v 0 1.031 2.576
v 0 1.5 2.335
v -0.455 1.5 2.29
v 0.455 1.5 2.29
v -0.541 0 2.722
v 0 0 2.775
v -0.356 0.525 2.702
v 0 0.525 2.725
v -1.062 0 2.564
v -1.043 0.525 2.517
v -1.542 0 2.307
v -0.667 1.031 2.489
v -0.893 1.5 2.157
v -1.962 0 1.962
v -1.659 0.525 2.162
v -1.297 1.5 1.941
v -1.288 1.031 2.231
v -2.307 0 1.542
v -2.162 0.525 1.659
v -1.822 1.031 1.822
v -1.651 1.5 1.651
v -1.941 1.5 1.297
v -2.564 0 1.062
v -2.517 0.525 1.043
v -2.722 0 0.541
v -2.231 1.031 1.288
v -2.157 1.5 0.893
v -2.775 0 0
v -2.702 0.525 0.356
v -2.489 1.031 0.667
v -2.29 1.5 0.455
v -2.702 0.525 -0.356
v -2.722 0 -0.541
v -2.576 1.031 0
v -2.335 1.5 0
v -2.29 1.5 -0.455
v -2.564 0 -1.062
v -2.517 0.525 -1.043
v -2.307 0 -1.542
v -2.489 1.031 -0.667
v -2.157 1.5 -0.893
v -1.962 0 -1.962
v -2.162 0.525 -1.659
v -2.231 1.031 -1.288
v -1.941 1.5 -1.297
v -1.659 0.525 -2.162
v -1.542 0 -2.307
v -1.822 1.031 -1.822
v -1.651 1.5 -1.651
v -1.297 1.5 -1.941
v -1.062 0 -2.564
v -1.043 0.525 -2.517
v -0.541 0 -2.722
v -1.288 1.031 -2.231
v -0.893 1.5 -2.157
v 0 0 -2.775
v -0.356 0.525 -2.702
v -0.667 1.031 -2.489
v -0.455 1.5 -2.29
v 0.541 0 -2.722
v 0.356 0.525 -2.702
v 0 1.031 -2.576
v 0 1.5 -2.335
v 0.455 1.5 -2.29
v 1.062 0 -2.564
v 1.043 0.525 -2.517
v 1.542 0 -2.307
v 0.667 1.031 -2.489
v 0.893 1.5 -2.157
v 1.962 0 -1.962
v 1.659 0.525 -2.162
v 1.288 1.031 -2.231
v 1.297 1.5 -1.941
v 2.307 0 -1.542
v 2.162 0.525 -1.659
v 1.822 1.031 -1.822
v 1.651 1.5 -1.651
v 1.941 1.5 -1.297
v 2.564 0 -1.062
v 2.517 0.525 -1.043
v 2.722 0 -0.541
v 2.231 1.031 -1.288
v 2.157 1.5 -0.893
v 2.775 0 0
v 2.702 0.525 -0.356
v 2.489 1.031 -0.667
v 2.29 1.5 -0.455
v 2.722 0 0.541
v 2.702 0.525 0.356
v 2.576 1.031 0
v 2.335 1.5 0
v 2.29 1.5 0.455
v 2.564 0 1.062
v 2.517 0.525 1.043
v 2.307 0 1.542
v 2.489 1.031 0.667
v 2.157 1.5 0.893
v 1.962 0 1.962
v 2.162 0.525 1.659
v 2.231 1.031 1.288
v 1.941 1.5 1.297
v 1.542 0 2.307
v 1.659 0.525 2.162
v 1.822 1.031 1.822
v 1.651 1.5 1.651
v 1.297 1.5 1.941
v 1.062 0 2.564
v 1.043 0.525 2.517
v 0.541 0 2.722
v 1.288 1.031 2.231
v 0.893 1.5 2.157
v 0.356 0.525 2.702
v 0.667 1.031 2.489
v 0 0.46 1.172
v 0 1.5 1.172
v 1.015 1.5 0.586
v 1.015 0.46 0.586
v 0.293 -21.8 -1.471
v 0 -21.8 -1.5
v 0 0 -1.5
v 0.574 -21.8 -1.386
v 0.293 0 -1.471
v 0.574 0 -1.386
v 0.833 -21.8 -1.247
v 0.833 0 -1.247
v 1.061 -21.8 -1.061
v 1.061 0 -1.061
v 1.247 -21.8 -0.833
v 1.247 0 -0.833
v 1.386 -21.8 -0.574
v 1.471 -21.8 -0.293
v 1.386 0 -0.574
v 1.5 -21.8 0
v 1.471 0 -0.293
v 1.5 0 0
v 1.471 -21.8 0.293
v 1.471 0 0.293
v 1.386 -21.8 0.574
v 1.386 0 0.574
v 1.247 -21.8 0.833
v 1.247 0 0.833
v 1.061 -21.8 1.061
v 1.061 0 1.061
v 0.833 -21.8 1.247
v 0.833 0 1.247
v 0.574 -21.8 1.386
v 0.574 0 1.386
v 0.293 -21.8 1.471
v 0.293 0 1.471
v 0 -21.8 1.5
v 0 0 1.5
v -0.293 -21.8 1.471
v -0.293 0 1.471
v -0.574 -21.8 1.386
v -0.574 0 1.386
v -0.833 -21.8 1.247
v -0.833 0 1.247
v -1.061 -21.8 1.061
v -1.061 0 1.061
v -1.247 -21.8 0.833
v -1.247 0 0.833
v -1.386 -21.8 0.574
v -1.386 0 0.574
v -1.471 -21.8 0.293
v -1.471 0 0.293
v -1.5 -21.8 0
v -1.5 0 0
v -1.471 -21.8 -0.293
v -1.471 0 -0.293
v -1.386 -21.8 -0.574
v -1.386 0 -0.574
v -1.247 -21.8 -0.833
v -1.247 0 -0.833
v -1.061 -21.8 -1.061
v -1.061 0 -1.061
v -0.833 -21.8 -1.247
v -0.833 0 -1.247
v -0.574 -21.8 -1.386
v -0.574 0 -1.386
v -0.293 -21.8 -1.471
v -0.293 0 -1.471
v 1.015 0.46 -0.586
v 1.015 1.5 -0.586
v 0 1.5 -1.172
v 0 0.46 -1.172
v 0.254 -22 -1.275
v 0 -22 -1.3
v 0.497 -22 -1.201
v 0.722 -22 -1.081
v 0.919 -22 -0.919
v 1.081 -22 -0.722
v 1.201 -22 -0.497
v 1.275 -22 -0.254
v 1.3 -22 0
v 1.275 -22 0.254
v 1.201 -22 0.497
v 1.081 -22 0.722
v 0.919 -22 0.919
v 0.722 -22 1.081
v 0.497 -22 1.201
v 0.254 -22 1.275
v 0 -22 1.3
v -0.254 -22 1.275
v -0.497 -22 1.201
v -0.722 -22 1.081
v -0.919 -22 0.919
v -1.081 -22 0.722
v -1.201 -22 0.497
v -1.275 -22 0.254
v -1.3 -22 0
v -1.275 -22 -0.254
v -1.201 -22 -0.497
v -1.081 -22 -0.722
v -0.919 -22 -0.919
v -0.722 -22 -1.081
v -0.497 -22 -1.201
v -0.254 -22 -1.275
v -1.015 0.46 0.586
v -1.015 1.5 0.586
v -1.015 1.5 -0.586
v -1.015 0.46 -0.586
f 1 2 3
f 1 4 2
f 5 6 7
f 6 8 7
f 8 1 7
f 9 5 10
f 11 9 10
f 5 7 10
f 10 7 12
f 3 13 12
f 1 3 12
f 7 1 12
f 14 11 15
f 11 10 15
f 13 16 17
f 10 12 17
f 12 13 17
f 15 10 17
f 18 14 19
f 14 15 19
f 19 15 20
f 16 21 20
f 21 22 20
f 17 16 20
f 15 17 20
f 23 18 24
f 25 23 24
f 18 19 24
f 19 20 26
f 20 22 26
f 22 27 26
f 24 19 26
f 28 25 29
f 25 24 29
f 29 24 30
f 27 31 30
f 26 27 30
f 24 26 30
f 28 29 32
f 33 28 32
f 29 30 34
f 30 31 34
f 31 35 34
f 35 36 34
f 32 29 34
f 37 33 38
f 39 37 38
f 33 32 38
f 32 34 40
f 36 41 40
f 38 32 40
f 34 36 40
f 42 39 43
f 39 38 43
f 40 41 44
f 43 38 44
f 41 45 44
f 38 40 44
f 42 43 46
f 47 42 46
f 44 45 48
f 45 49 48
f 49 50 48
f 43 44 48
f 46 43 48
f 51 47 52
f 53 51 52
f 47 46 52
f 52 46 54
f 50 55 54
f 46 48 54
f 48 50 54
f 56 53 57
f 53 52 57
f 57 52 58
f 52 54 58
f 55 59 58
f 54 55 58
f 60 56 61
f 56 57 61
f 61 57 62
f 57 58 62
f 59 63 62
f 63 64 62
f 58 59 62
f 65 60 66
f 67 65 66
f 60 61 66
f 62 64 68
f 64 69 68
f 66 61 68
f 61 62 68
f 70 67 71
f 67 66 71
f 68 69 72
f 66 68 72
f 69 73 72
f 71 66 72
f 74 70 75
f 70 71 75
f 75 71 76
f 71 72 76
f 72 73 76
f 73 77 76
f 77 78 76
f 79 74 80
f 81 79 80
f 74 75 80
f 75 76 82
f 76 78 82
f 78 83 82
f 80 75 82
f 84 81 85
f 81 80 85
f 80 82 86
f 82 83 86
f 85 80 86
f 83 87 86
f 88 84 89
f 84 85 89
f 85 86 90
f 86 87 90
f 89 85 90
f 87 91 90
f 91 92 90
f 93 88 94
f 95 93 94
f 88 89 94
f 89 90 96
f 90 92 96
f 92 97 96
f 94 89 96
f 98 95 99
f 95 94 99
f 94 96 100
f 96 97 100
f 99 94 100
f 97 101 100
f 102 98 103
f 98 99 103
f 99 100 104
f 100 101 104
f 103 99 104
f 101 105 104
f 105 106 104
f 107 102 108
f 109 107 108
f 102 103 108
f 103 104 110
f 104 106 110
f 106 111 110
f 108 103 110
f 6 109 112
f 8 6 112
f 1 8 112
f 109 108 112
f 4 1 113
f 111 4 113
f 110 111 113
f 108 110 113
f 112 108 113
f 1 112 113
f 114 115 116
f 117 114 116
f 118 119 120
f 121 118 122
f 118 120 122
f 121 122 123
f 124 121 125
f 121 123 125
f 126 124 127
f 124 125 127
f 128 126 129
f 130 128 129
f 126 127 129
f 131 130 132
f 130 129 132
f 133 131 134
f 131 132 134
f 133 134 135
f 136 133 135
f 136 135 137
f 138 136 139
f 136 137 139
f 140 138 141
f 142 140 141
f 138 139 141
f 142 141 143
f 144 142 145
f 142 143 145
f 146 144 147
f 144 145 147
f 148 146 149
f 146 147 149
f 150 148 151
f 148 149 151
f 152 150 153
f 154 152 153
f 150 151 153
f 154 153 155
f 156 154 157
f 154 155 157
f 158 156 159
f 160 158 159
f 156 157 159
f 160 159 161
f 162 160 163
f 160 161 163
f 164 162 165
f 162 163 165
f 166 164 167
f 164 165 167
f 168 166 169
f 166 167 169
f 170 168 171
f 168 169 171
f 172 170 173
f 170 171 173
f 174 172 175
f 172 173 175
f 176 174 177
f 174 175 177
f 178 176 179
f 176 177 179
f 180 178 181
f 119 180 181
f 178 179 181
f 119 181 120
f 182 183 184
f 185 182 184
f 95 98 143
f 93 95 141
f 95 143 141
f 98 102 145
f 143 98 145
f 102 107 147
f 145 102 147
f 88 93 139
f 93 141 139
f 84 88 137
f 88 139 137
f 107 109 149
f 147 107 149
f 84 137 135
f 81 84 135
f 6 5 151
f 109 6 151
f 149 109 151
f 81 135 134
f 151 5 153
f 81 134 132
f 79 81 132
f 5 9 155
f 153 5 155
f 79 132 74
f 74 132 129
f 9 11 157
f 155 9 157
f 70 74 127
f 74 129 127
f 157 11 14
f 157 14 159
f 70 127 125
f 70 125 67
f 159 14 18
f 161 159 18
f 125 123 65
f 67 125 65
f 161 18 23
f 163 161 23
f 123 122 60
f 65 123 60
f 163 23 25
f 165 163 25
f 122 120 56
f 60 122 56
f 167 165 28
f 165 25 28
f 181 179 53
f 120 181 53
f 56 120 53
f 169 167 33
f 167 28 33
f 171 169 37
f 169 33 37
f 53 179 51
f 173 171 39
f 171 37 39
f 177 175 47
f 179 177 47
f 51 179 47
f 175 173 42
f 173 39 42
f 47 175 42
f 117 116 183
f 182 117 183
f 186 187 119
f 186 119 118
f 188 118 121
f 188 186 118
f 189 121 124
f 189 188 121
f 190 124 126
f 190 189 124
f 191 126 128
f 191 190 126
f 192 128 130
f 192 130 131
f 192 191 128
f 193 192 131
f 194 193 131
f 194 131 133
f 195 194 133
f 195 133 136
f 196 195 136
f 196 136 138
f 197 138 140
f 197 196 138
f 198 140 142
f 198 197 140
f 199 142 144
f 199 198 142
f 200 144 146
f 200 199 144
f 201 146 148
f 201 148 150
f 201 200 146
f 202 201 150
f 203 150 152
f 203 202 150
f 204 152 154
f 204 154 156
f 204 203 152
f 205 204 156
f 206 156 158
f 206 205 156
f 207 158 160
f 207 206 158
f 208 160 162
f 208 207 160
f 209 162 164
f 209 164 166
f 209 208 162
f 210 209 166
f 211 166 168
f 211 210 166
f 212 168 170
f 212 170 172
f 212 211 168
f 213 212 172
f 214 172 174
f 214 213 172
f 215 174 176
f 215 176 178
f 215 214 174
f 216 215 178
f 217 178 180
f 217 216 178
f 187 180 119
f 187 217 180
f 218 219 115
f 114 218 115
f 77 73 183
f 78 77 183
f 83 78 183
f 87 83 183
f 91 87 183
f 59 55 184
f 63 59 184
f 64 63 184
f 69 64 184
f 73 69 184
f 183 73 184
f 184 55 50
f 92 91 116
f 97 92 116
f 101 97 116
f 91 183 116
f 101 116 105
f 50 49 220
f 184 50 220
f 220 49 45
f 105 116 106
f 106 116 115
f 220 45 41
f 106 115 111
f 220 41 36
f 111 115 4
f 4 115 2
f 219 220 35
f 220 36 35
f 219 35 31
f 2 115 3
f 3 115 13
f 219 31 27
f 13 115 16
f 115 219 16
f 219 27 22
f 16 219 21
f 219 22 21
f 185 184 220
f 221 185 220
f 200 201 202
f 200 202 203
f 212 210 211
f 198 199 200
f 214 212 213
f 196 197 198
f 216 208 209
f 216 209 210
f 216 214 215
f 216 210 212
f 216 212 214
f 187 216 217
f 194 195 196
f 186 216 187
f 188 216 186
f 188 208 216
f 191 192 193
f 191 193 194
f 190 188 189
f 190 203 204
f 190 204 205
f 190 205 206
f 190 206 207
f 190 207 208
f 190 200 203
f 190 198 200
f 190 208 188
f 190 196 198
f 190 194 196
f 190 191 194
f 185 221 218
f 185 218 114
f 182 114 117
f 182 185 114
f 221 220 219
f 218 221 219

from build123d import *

# Parameters (mm, degrees)
SKETCH_2_R          = 1.5
EXTRUDE_1_DEPTH     = 22
CUT_EXTRUDE_1_DEPTH = 1.04
CHAMFER_1_SIZE      = 0.2


with BuildPart() as part:
    # 草图1 → 旋转1 (revolve)
    with BuildSketch(Plane.XY, mode=Mode.PRIVATE) as revolve_1_sk:
        with BuildLine():
            Line((0, 0), (-2.775, 0))
            ThreePointArc((-2.775, 0), (-2.662639591, 0.78164916), (-2.334657362, 1.5))
            Line((-2.334657362, 1.5), (0, 1.5))
            Line((0, 1.5), (0, 0))
        make_face()
    revolve(revolve_1_sk.sketch.rotate(Axis((0, 5.111773046, 0), (0, -1, 0)), 270), axis=Axis((0, 5.111773046, 0), (0, -1, 0)))

    # 草图2 → 凸台-拉伸1 (add)
    with BuildSketch(Plane.XZ):
        with Locations(Location((0, 0, 0), (0, 0, 270))):
            Circle(SKETCH_2_R)
    extrude(amount=EXTRUDE_1_DEPTH)

    # 草图3 → 切除-拉伸1 (cut)
    with BuildSketch(Plane(origin=(0, 1.5, 0), x_dir=(1, 0, 0), z_dir=(0, 1, 0))):
        Polygon((0, 1.172021046), (-1.015, 0.586010523), (-1.015, -0.586010523), (0, -1.172021046), (1.015, -0.586010523), (1.015, 0.586010523), align=None)
    extrude(amount=-CUT_EXTRUDE_1_DEPTH, mode=Mode.SUBTRACT)

    # 倒角1
    chamfer_1_edges = [part.edges().sort_by_distance(p)[0] for p in [
        (0, -22, 1.5),
    ]]
    chamfer(chamfer_1_edges, length=CHAMFER_1_SIZE)


solid = part.part
